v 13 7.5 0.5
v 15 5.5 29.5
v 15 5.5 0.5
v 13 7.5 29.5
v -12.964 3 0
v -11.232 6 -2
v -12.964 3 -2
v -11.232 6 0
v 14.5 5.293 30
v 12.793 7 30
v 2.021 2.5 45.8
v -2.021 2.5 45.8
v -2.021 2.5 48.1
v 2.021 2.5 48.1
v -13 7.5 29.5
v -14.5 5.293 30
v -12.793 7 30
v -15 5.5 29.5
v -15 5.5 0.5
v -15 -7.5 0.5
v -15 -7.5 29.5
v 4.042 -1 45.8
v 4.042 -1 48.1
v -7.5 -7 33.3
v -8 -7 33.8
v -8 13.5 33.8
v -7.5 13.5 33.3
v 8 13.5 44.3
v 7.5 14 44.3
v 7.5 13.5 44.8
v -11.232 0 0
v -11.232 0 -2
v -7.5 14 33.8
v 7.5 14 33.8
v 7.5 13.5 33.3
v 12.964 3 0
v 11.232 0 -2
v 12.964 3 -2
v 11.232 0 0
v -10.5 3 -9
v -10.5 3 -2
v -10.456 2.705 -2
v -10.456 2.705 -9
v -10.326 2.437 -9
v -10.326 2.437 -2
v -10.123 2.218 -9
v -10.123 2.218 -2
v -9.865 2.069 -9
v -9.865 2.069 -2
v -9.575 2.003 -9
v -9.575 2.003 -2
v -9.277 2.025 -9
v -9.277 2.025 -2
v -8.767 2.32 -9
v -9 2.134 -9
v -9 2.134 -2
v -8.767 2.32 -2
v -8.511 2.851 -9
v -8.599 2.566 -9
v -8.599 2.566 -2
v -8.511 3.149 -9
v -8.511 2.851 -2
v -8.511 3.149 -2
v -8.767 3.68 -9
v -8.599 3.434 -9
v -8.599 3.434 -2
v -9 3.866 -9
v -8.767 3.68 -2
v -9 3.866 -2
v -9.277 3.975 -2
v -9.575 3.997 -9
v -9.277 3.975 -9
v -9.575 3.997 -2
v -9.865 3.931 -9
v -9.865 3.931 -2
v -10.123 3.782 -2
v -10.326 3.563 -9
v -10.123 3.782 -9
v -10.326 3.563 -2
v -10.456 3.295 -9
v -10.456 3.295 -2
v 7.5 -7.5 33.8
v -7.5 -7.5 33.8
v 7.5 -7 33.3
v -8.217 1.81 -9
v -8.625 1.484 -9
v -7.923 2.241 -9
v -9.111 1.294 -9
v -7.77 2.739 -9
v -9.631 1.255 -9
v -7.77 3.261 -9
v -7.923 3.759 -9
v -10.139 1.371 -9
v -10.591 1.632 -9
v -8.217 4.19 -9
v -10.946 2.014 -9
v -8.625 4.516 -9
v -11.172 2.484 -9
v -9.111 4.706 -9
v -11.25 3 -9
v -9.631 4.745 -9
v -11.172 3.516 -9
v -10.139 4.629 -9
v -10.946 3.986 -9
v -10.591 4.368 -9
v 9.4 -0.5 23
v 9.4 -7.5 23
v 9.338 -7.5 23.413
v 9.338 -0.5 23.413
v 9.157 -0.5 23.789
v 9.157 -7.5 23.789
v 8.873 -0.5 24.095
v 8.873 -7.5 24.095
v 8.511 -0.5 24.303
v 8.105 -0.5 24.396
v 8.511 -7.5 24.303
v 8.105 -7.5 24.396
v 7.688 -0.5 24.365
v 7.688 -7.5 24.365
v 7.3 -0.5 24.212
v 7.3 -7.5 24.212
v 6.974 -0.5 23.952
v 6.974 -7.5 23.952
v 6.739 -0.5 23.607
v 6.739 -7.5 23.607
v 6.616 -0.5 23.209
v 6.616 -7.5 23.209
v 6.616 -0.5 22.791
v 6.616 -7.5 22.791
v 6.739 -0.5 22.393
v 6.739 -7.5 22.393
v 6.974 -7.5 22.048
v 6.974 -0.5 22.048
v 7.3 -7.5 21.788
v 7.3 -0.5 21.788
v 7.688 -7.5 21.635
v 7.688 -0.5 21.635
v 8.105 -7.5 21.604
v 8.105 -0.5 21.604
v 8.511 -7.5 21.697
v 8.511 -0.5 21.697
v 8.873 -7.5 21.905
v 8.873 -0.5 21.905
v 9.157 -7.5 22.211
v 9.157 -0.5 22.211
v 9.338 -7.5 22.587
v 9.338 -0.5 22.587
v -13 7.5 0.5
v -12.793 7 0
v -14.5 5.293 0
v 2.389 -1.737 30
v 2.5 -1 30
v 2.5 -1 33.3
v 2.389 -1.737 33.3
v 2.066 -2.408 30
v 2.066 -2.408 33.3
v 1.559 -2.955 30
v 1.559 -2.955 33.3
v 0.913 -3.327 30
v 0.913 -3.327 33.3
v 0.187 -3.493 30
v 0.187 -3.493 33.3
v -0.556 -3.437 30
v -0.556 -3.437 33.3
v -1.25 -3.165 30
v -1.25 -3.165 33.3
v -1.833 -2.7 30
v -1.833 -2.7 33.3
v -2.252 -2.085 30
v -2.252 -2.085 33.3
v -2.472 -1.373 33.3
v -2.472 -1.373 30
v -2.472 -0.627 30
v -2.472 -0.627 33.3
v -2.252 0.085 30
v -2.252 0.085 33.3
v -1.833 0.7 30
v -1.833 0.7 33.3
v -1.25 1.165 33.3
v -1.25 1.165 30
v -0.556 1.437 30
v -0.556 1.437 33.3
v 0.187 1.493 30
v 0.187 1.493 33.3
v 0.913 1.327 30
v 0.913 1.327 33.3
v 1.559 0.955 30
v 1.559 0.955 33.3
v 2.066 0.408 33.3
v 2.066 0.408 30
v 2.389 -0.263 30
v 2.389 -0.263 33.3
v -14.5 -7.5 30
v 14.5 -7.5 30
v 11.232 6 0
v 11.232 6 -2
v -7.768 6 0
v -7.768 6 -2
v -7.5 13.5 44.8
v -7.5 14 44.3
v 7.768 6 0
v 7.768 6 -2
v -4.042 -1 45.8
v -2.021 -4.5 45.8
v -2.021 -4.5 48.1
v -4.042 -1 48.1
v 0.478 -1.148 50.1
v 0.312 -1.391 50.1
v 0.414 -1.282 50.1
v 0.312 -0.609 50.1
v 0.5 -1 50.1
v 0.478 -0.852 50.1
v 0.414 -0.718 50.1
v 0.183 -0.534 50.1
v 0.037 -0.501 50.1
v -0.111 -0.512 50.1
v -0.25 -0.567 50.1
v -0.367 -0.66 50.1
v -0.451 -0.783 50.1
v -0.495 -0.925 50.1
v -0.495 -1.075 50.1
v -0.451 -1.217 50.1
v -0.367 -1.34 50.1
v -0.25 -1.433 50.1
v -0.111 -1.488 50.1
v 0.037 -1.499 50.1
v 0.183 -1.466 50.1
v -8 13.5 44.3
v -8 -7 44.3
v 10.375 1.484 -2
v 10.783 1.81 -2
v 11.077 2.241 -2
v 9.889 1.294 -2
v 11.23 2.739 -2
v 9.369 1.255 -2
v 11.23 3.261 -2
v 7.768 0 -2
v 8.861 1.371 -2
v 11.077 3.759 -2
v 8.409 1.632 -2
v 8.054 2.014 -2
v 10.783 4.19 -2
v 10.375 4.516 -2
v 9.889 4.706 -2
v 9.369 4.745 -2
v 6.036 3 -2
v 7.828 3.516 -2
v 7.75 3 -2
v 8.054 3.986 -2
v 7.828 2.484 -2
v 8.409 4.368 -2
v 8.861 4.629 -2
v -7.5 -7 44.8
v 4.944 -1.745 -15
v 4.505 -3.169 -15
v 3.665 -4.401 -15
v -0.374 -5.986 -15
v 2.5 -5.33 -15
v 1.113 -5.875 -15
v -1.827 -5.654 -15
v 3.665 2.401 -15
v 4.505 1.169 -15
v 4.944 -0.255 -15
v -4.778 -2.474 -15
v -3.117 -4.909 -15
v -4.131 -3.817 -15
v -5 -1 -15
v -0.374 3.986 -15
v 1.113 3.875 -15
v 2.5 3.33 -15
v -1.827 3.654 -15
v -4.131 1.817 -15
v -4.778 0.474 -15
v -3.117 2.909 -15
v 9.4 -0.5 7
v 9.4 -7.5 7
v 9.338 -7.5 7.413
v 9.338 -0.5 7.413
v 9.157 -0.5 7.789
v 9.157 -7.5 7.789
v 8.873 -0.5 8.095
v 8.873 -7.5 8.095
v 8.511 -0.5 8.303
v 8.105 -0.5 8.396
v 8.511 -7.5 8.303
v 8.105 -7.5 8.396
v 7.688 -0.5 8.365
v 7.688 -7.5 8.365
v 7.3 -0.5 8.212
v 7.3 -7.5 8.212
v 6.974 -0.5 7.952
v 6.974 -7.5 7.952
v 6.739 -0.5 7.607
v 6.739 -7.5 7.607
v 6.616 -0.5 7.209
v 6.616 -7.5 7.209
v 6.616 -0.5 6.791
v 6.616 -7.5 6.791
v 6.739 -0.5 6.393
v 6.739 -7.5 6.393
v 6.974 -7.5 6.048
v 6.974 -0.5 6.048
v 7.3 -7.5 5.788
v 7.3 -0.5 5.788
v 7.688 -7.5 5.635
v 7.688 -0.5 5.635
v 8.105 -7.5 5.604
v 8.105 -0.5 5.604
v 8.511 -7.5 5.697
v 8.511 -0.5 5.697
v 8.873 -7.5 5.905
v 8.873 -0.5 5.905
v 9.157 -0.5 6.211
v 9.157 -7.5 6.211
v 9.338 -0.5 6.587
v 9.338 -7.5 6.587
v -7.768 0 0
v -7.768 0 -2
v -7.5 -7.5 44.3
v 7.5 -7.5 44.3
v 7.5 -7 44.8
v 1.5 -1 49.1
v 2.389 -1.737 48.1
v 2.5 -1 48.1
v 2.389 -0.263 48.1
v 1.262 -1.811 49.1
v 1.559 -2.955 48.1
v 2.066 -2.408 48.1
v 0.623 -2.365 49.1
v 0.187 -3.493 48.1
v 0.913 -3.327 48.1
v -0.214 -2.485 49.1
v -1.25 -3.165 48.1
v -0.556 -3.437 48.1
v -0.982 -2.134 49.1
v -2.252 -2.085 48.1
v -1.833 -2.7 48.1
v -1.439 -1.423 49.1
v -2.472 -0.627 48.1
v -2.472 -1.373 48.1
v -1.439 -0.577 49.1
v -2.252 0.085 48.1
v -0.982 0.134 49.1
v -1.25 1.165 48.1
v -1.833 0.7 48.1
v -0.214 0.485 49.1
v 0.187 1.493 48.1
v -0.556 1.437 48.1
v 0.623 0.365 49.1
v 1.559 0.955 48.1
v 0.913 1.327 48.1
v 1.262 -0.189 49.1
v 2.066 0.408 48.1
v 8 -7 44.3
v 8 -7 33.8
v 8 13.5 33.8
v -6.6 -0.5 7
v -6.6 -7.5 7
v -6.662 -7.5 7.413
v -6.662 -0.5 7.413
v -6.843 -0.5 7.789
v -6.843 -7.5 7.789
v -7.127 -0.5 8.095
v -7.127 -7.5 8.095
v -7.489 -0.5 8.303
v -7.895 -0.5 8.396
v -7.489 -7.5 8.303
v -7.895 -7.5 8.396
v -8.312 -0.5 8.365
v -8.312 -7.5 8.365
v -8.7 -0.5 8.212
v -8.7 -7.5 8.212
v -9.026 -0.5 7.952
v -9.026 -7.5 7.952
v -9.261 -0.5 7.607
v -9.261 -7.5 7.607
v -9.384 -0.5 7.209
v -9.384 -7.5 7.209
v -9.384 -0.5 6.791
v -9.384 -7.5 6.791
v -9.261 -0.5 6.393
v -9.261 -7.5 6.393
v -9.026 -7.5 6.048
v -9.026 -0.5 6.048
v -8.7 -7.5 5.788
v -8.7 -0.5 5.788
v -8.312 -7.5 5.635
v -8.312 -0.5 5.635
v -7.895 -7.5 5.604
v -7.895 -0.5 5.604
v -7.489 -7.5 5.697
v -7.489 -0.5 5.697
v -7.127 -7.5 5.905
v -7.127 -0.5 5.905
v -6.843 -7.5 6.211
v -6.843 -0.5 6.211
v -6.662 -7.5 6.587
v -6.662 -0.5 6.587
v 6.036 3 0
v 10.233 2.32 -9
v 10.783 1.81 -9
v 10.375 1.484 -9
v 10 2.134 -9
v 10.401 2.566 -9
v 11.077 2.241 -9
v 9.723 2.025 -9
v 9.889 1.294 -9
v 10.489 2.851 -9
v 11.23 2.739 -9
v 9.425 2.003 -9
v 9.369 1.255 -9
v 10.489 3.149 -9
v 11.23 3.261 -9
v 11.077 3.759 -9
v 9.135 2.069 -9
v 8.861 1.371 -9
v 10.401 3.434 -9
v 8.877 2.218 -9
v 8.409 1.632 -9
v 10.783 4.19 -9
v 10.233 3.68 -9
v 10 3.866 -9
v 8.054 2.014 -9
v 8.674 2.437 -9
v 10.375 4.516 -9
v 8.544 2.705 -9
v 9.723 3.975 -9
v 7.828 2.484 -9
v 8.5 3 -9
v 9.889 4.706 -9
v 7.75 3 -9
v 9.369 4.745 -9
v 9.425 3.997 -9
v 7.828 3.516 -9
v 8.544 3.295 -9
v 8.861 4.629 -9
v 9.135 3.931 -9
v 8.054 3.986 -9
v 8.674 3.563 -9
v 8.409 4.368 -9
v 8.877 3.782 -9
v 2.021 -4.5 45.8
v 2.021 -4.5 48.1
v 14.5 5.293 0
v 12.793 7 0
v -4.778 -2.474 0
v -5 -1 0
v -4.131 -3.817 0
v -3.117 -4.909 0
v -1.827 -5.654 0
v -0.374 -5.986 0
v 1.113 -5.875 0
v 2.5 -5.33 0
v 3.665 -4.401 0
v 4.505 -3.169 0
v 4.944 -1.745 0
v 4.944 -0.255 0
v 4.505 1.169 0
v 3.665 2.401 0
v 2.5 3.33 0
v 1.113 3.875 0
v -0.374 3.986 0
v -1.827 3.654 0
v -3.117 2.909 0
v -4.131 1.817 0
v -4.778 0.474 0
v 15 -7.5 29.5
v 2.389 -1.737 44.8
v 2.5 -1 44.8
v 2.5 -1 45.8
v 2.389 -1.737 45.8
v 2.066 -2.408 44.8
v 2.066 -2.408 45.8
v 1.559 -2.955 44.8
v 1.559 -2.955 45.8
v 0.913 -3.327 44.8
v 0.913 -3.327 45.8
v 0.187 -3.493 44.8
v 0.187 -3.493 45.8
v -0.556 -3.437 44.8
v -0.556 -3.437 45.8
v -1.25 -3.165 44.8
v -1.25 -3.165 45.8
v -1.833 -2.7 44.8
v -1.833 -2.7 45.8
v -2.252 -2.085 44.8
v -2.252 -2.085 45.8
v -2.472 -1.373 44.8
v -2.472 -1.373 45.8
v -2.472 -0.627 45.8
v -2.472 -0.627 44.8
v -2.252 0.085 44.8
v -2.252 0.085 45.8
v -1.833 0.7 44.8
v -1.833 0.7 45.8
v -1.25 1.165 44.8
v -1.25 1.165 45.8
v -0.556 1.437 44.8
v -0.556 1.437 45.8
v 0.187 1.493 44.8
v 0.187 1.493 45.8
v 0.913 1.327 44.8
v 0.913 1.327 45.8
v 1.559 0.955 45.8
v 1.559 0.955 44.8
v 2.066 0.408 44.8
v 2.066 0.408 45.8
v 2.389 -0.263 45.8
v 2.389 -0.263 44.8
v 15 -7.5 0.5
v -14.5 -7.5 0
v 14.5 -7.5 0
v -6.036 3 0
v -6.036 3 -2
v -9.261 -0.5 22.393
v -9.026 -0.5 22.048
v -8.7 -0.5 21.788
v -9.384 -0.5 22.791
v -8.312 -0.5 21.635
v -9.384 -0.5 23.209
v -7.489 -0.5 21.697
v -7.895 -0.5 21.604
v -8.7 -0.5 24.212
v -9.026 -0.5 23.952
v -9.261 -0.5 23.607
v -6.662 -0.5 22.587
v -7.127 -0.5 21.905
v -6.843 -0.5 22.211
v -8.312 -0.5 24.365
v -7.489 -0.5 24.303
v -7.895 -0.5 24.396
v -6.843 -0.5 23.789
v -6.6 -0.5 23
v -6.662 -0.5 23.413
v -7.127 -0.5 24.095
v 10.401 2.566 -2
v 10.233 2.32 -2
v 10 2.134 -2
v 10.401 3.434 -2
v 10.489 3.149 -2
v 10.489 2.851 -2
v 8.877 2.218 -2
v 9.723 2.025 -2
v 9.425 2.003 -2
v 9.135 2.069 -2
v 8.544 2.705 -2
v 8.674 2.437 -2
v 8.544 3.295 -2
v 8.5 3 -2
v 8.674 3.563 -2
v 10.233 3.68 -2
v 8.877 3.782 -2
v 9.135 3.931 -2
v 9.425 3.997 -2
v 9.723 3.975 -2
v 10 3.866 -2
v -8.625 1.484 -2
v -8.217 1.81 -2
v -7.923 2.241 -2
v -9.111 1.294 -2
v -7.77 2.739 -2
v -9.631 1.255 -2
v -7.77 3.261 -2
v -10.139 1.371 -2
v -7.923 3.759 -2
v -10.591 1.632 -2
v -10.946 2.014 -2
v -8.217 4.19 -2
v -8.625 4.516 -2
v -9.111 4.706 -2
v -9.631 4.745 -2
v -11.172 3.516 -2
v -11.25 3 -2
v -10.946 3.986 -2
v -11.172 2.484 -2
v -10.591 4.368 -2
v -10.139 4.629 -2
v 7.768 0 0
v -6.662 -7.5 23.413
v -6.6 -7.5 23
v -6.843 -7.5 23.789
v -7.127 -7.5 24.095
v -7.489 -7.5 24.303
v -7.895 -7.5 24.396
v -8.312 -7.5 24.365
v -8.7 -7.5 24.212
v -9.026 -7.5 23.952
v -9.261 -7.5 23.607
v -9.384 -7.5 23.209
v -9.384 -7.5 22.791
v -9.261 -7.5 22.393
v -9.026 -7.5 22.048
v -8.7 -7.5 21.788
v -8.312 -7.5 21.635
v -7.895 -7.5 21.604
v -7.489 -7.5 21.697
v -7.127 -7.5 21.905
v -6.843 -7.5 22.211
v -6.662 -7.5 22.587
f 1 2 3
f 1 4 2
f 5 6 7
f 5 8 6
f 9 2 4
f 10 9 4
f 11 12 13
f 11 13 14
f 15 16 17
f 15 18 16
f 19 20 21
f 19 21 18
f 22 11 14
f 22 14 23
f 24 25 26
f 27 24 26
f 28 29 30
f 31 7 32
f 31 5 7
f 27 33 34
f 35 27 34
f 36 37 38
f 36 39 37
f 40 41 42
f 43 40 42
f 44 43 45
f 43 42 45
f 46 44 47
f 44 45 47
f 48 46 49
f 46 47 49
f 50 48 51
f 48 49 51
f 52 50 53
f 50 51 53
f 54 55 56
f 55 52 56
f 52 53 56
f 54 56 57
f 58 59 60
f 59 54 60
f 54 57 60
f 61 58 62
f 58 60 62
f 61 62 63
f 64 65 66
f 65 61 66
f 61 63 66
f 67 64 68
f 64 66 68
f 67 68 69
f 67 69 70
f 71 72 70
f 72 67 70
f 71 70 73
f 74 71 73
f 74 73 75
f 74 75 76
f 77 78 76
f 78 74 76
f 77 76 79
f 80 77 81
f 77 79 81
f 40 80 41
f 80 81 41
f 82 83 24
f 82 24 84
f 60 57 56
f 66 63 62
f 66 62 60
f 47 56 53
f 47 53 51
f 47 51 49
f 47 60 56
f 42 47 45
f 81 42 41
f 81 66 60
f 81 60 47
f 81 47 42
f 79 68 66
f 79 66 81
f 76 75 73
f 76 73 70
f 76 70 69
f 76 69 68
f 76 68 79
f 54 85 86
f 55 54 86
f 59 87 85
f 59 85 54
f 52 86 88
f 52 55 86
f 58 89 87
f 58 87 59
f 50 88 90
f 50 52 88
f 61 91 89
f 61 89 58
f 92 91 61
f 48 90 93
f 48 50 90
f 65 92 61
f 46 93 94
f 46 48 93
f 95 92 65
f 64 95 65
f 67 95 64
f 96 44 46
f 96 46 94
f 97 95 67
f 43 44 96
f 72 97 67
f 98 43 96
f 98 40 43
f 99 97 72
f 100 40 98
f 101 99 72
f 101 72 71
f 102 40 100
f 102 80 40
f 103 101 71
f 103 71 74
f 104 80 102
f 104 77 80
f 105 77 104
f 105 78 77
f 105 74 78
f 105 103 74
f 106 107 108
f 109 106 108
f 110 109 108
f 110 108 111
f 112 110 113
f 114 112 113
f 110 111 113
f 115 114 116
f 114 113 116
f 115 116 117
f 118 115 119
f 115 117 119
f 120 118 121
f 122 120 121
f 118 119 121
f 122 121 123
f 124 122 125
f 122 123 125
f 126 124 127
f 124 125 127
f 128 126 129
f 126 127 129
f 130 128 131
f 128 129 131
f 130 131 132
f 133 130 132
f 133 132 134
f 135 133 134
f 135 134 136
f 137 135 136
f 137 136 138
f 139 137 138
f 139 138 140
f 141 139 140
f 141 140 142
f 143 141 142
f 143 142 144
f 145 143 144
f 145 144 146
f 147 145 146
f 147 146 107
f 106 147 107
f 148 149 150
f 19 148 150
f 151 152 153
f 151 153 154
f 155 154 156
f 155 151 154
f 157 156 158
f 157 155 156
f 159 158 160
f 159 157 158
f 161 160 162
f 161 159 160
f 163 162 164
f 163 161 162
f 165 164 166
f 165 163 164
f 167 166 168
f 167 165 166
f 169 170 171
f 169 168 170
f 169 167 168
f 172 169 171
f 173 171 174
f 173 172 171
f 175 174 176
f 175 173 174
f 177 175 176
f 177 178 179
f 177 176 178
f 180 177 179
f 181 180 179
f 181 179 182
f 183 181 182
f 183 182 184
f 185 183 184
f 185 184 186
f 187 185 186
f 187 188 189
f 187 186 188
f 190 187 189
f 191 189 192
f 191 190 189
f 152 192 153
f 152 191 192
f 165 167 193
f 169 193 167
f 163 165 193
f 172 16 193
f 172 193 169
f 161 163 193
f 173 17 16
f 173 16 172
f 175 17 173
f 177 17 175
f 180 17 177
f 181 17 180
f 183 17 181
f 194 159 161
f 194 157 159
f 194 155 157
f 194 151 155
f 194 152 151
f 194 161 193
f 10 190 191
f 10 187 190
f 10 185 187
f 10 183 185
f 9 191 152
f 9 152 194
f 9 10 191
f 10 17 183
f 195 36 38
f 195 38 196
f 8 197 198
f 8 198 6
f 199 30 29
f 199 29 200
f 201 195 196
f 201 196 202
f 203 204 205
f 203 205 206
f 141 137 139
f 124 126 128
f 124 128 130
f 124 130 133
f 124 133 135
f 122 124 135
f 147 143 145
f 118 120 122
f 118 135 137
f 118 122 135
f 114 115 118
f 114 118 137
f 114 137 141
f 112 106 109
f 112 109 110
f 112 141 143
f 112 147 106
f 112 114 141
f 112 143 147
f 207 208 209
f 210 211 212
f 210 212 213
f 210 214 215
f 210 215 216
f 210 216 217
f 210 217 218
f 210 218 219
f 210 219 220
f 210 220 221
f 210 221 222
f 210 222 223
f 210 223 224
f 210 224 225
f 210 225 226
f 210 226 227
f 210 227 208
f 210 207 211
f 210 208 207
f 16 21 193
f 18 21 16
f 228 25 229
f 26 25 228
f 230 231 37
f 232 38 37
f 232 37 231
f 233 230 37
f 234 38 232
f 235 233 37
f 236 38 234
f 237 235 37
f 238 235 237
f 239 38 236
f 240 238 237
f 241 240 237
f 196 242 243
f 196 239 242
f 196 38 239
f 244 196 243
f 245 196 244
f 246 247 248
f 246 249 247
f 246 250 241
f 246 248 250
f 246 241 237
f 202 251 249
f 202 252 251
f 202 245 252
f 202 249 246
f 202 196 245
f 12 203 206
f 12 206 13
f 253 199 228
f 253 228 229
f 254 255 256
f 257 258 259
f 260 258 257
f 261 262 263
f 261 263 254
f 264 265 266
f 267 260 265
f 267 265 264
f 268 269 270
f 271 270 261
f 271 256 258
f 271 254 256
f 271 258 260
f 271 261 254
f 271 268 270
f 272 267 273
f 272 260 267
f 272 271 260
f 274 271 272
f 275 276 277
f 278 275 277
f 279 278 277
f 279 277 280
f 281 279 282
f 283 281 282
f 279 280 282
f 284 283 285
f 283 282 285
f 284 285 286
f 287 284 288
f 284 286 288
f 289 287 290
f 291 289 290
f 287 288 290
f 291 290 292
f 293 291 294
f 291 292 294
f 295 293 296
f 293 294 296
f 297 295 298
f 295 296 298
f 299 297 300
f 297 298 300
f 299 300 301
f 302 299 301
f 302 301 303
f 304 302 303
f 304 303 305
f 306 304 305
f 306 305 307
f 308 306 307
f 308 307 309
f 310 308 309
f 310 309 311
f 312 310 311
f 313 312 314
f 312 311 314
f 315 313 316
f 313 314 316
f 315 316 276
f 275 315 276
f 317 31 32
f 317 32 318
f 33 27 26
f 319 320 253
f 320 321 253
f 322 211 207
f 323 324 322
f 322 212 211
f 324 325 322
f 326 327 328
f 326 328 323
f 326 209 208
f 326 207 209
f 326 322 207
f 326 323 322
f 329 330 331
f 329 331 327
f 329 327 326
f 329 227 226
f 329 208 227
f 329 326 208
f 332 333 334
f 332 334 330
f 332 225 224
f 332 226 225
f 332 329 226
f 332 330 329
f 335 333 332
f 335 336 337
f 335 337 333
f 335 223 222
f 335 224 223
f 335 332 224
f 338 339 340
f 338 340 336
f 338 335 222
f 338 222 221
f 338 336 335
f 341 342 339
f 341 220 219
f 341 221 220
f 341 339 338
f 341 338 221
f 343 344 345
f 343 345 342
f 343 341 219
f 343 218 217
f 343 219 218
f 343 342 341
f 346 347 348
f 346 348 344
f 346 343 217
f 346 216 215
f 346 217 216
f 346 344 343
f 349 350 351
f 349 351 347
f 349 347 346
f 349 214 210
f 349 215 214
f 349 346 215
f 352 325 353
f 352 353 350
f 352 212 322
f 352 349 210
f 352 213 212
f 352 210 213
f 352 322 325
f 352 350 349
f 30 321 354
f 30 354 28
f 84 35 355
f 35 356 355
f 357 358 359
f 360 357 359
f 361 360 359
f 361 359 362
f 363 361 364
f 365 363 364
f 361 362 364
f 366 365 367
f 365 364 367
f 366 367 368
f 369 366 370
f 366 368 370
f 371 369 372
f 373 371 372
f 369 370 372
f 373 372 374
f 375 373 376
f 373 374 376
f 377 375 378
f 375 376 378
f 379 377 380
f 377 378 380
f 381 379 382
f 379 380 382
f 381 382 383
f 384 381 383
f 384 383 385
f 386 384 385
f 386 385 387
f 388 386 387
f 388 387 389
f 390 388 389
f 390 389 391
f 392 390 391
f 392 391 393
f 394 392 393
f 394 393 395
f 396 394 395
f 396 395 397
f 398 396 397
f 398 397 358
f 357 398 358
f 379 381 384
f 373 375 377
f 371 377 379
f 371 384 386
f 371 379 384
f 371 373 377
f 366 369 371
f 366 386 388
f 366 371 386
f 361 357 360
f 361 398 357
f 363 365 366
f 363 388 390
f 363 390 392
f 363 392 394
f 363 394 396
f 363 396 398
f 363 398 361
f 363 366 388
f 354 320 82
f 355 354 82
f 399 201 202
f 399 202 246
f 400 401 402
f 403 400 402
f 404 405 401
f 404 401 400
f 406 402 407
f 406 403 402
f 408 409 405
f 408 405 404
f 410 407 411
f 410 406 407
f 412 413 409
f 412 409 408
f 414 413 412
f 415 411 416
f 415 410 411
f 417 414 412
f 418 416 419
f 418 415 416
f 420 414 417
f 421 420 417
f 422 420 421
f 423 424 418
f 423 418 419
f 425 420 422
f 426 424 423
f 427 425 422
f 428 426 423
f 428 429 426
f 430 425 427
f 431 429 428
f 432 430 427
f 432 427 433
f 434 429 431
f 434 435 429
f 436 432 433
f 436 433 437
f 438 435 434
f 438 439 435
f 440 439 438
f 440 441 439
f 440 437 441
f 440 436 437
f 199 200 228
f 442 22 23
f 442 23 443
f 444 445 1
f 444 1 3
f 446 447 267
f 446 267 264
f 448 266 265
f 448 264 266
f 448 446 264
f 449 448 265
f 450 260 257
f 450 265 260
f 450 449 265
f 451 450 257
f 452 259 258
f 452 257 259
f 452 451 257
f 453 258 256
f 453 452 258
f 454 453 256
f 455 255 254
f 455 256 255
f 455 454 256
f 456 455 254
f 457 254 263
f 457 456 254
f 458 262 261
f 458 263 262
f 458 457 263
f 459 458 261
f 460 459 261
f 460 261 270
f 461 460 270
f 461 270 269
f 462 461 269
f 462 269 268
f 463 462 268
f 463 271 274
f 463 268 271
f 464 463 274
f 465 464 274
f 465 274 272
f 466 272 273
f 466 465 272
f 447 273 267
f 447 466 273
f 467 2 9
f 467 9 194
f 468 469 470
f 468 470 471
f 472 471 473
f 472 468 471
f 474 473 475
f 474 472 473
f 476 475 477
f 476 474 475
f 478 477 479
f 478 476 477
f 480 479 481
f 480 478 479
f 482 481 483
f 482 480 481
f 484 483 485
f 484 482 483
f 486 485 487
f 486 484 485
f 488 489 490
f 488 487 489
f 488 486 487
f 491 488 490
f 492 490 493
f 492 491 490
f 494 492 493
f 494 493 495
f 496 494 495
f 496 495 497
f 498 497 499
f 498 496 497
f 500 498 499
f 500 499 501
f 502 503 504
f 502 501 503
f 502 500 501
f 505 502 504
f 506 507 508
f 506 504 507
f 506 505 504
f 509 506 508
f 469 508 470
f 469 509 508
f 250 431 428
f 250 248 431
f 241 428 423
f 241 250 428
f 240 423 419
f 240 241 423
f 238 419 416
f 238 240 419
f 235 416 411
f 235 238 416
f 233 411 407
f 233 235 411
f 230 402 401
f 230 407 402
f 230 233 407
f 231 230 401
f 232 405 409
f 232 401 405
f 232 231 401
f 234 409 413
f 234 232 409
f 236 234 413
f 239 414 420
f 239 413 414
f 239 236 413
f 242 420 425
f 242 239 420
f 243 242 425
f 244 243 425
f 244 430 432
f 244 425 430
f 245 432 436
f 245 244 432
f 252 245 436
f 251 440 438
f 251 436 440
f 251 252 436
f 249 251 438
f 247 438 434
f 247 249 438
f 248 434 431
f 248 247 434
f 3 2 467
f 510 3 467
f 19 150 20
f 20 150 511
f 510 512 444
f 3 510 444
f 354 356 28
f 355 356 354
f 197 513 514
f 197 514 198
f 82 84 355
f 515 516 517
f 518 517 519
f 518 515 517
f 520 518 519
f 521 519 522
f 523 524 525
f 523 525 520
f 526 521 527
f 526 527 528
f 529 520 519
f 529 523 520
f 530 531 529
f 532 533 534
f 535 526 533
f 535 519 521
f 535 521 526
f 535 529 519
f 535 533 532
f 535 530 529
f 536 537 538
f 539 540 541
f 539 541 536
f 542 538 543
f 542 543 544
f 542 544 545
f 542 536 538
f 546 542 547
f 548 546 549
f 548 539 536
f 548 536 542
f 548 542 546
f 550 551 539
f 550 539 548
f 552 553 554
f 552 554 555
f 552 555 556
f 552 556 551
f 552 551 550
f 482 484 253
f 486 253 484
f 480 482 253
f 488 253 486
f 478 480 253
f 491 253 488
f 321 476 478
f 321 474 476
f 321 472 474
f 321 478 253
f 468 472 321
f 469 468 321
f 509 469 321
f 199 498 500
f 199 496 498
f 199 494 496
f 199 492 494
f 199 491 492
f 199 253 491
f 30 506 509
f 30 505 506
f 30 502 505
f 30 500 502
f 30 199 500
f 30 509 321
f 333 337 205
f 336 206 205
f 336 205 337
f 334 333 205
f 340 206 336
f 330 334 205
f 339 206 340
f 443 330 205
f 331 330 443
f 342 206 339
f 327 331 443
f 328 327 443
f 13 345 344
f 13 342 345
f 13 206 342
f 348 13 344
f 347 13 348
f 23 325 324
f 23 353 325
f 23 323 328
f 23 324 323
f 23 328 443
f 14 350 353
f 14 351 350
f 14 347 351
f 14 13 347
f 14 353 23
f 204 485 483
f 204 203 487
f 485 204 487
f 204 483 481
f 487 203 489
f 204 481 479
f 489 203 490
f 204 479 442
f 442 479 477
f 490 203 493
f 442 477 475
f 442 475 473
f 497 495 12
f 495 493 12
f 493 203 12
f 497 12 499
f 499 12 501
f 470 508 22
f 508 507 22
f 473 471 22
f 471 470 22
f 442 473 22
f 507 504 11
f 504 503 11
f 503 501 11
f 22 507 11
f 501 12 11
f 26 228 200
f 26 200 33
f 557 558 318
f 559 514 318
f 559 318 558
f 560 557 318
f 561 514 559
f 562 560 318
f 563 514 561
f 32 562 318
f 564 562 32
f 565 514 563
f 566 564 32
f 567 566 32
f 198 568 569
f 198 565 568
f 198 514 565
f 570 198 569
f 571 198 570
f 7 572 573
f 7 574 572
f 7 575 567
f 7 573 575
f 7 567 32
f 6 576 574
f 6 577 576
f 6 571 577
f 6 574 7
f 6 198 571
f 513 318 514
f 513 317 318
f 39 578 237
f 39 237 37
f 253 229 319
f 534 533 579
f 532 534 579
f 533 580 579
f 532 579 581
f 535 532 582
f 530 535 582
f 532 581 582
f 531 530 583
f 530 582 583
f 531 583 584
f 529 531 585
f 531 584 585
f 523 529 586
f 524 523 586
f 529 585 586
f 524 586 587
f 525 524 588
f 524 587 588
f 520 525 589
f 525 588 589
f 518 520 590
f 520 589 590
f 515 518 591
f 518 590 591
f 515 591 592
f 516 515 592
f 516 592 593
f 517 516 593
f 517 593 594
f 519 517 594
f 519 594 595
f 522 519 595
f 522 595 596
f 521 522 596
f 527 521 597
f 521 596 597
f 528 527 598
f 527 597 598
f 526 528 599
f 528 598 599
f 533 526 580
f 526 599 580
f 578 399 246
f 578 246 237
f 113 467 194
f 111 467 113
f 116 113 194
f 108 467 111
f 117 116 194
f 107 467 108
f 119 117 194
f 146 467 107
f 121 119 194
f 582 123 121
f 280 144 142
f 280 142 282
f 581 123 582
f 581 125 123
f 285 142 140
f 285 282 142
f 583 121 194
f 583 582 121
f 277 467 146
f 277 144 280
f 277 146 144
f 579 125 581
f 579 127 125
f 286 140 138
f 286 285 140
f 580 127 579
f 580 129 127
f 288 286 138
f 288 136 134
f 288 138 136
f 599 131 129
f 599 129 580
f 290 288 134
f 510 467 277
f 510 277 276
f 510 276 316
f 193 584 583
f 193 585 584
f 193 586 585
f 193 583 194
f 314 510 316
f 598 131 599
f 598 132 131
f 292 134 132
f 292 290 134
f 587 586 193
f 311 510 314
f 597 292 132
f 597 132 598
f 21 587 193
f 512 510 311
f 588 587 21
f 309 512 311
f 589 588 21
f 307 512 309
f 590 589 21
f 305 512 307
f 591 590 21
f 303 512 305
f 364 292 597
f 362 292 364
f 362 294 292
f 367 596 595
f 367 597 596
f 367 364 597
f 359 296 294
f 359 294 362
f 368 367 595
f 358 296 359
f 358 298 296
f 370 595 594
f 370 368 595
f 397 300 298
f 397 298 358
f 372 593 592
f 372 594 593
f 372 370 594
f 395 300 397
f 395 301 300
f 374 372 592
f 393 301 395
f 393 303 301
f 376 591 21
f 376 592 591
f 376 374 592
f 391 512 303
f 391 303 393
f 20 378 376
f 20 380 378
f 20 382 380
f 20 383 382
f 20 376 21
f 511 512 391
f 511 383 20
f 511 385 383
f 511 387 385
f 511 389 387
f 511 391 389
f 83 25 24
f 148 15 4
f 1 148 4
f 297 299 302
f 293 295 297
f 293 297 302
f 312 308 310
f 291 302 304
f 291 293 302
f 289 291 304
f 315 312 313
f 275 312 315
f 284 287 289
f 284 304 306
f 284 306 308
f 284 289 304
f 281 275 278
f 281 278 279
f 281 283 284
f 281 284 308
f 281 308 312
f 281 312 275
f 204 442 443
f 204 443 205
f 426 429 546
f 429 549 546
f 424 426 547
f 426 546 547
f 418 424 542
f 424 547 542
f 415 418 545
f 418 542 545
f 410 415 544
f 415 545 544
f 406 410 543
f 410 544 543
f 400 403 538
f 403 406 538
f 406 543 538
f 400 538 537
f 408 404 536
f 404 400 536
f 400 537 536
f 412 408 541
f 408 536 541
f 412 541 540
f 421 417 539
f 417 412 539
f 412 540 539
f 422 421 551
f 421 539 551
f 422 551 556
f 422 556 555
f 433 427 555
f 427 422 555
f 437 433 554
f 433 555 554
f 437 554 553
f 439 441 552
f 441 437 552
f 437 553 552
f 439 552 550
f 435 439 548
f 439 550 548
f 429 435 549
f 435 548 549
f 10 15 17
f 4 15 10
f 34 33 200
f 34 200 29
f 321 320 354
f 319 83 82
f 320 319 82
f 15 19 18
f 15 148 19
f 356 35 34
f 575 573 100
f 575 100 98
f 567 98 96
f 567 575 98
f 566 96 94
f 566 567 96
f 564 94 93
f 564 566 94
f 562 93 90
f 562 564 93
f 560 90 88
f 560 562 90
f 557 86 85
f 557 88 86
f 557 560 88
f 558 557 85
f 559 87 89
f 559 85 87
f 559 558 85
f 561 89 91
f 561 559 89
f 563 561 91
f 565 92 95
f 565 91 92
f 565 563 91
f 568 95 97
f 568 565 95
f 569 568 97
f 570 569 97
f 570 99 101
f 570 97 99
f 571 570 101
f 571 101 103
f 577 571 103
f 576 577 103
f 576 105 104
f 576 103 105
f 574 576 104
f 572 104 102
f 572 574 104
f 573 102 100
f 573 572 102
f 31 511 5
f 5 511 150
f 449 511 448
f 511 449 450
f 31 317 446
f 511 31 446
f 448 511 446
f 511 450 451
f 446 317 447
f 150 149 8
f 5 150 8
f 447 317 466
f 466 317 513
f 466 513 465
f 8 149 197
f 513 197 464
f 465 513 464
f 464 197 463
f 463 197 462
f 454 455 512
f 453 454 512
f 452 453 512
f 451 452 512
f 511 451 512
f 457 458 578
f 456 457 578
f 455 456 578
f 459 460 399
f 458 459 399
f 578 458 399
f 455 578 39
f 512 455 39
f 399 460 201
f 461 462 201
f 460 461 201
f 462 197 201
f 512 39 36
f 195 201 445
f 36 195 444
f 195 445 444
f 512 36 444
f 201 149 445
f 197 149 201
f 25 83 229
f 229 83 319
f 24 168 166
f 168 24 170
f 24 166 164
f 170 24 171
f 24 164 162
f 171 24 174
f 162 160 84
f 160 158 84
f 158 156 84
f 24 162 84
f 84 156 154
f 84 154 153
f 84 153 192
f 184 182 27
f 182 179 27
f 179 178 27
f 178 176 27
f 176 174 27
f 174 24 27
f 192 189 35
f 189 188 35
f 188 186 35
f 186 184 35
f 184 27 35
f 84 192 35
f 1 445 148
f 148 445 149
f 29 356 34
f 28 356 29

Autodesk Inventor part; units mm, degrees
ref_plane "YZ Plane" through (0, 0, 0) normal (1, 0, 0) x (0, 1, 0)
ref_plane "XZ Plane" through (0, 0, 0) normal (0, 1, 0) x (-1, 0, 0)
ref_plane "XY Plane" through (0, 0, 0) normal (0, 0, 1) x (1, 0, 0)
sketch "Sketch1" plane through (0, 0, 0) normal (0, 0, 1) x (1, 0, 0)
  line L0 (15, -7.5) -> (-15, -7.5)
  line L1 (-15, -7.5) -> (-15, 7.5)
  line L2 (-15, 7.5) -> (15, 7.5)
  line L3 (15, 7.5) -> (15, -7.5)
  line L4 (15, -7.5) -> (-15, 7.5) construction
  line L5 (-15, -7.5) -> (15, 7.5) construction
  point P0 (0, 0)
  dimension "d0" = 15
  dimension "d1" = 30
extrude "Extrusion1" add sketch "Sketch1" along normal blind 30
sketch "Sketch2" plane through (0, 0, 30) normal (0, 0, 1) x (1, 0, 0)
  line L0 (15, 7.5) -> (-15, 7.5) projected
  line L1 (-15, 7.5) -> (-15, -7.5) projected
  line L2 (-15, -7.5) -> (15, -7.5) projected
  line L3 (15, -7.5) -> (15, 7.5) projected
  circle A0 centre (0, -1) radius 2.5
  point P0 (0, 0)
  dimension "d4" = 6.5
  dimension "d5" = 5
extrude "Extrusion2" add sketch "Sketch2" along normal blind 3.3 contours A0
sketch "Sketch3" plane through (0, -1, 33.3) normal (0, 0, 1) x (1, 0, 0)
  circle A0 centre (0, 0) radius 2.5 projected
  line L0 (-8, 15) -> (8, 15)
  line L1 (8, 15) -> (8, -8)
  line L2 (8, -8) -> (-8, -8)
  line L3 (-8, -8) -> (-8, 15)
  line L4 (-8, 15) -> (8, -8) construction
  line L5 (8, 15) -> (-8, -8) construction
  line L6 (-15, -6.5) -> (15, -6.5) projected
  point P0 (0, 1)
  point P1 (0, 3.5)
  point P2 (0, 3.5)
  point P3 (-8, -6.5)
  point P4 (8, -6.5)
  dimension "d9" = 23
  dimension "d10" = 16
  dimension "d11" = 8
extrude "Extrusion3" add sketch "Sketch3" along normal blind 11.5 contours A0 | L0 L1 L6 L3
sketch "Sketch4" plane through (-15, -7.5, 0) normal (0, -1, 0) x (1, 0, 0)
  line L0 (0, 0) -> (30, 0) projected
  line L1 (30, 0) -> (30, 30) projected
  line L2 (0, 30) -> (30, 30) projected
  line L3 (0, 0) -> (0, 30) projected
  circle A0 centre (7, 7) radius 1.4
  circle A1 centre (23, 7) radius 1.4
  circle A2 centre (7, 23) radius 1.4
  circle A3 centre (23, 23) radius 1.4
  point P0 (15, 0)
  point P1 (15, 30)
  dimension "d16" = 16
  dimension "d19" = 16
  dimension "d22" = 8
  dimension "d23" = 7
  dimension "d24" = 2.8
extrude "Extrusion4" cut sketch "Sketch4" against normal blind 7 contours A0 | A1 | A2 | A3
sketch "Sketch5" plane through (0, -1, 44.8) normal (0, 0, 1) x (1, 0, 0)
  circle A0 centre (0, 0) radius 2.5 projected
  line L0 (-2.0207, 3.5) -> (2.0207, 3.5)
  line L1 (2.0207, 3.5) -> (4.0415, 0)
  line L2 (4.0415, 0) -> (2.0207, -3.5)
  line L3 (2.0207, -3.5) -> (-2.0207, -3.5)
  line L4 (-2.0207, -3.5) -> (-4.0415, 0)
  line L5 (-4.0415, 0) -> (-2.0207, 3.5)
  point P0 (0, 1)
  dimension "d35" = 7
extrude "Extrusion5" add sketch "Sketch5" along normal blind 3.3 contours A0 | L0 L1 L2 L3 L4 L5
sketch "Sketch6" plane through (0, -1, 48.1) normal (0, 0, 1) x (1, 0, 0)
  line L0 (-4.0415, 0) -> (-2.0207, -3.5) projected
  line L1 (-2.0207, -3.5) -> (2.0207, -3.5) projected
  line L2 (2.0207, -3.5) -> (4.0415, 0) projected
  line L3 (4.0415, 0) -> (2.0207, 3.5) projected
  line L4 (2.0207, 3.5) -> (-2.0207, 3.5) projected
  line L5 (-2.0207, 3.5) -> (-4.0415, 0) projected
  circle A0 centre (0, 0) radius 2.5 projected
  point P0 (0, 1)
extrude "Extrusion6" add sketch "Sketch6" along normal blind 2 contours A0
chamfer "Chamfer1" distance 2 angle 45 1 edges at (-2.5, -1, 50.1)
sketch "Sketch7" plane through (0, -1, 44.8) normal (0, 0, 1) x (1, 0, 0)
  circle A0 centre (0, 0) radius 2.5 projected
  circle A1 centre (0, 0) radius 2.5 projected
  line L0 (-4.0415, 0) -> (-2.0207, -3.5) projected
  line L1 (-2.0207, -3.5) -> (2.0207, -3.5) projected
  line L2 (2.0207, -3.5) -> (4.0415, 0) projected
  line L3 (4.0415, 0) -> (2.0207, 3.5) projected
  line L4 (2.0207, 3.5) -> (-2.0207, 3.5) projected
  line L5 (-2.0207, 3.5) -> (-4.0415, 0) projected
  point P0 (0, 1)
extrude "Extrusion7" cut sketch "Sketch7" along normal blind 1
chamfer "Chamfer2" distance 2 angle 45 2 edges at (-15, 7.5, 15) (15, 7.5, 15)
chamfer "Chamfer3" distance 0.5 angle 45 22 edges at (-8, 3.25, 33.3) (8, 3.25, 33.3) (0, 14, 33.3) (8, 14, 39.05) (-8, 14, 39.05) (0, 14, 44.8) (-8, 3.25, 44.8) (-8, -7.5, 39.05) (0, -7.5, 33.3) (8, -7.5, 39.05) (0, -7.5, 44.8) (8, 3.25, 44.8) (0, 7.5, 30) (15, -1, 30) (14, 6.5, 30) (-15, -1, 30) (-14, 6.5, 30) (-15, -1, 0) (-14, 6.5, 0) (0, 7.5, 0) (14, 6.5, 0) (15, -1, 0)
sketch "Sketch8" plane through (0, 0, 0) normal (0, 0, -1) x (-1, 0, 0)
  line L0 (-14.5, -7.5) -> (-14.5, 5.2929) projected
  line L1 (14.5, -7.5) -> (-14.5, -7.5) projected
  line L2 (14.5, 5.2929) -> (14.5, -7.5) projected
  line L3 (12.7929, 7) -> (14.5, 5.2929) projected
  line L4 (-12.7929, 7) -> (12.7929, 7) projected
  line L5 (-14.5, 5.2929) -> (-12.7929, 7) projected
  line L6 (7.7679, 6) -> (11.2321, 6)
  line L7 (11.2321, 6) -> (12.9641, 3)
  line L8 (12.9641, 3) -> (11.2321, 0)
  line L9 (11.2321, 0) -> (7.7679, 0)
  line L10 (7.7679, 0) -> (6.0359, 3)
  line L11 (6.0359, 3) -> (7.7679, 6)
  line L12 (-11.2321, 6) -> (-7.7679, 6)
  line L13 (-7.7679, 6) -> (-6.0359, 3)
  line L14 (-6.0359, 3) -> (-7.7679, 0)
  line L15 (-7.7679, 0) -> (-11.2321, 0)
  line L16 (-11.2321, 0) -> (-12.9641, 3)
  line L17 (-12.9641, 3) -> (-11.2321, 6)
  point P0 (0, 0)
  point P1 (9.5, 3)
  point P2 (-9.5, 3)
  dimension "d51" = 6
  dimension "d52" = 5
  dimension "d53" = 5
  dimension "d54" = 4
extrude "Extrusion8" add sketch "Sketch8" along normal blind 2 contours L6 L7 L8 L9 L10 L11 | L12 L13 L14 L15 L16 L17
sketch "Sketch9" plane through (0, 0, -2) normal (0, 0, -1) x (-1, 0, 0)
  line L0 (6.0359, 3) -> (7.7679, 0) projected
  line L1 (7.7679, 0) -> (11.2321, 0) projected
  line L2 (11.2321, 0) -> (12.9641, 3) projected
  line L3 (12.9641, 3) -> (11.2321, 6) projected
  line L4 (11.2321, 6) -> (7.7679, 6) projected
  line L5 (7.7679, 6) -> (6.0359, 3) projected
  line L6 (-12.9641, 3) -> (-11.2321, 0) projected
  line L7 (-11.2321, 0) -> (-7.7679, 0) projected
  line L8 (-7.7679, 0) -> (-6.0359, 3) projected
  line L9 (-6.0359, 3) -> (-7.7679, 6) projected
  line L10 (-7.7679, 6) -> (-11.2321, 6) projected
  line L11 (-11.2321, 6) -> (-12.9641, 3) projected
  circle A0 centre (9.5, 3) radius 1.75
  circle A1 centre (-9.5, 3) radius 1.75
  circle A2 centre (9.5, 3) radius 1
  circle A3 centre (-9.5, 3) radius 1
  point P0 (0, 0)
  point P1 (9.5, 0)
  point P2 (-9.5, 0)
  dimension "d57" = 3.5
  dimension "d58" = 2
extrude "Extrusion9" add sketch "Sketch9" along normal blind 7 contours A0 | A1
sketch "Sketch10" plane through (0, 0, 0) normal (0, 0, -1) x (-1, 0, 0)
  line L0 (-12.9641, 3) -> (-11.2321, 6) projected
  line L1 (-11.2321, 6) -> (-7.7679, 6) projected
  line L2 (-7.7679, 6) -> (-6.0359, 3) projected
  line L3 (-6.0359, 3) -> (-7.7679, 0) projected
  line L4 (-7.7679, 0) -> (-11.2321, 0) projected
  line L5 (-11.2321, 0) -> (-12.9641, 3) projected
  line L6 (6.0359, 3) -> (7.7679, 6) projected
  line L7 (7.7679, 6) -> (11.2321, 6) projected
  line L8 (11.2321, 6) -> (12.9641, 3) projected
  line L9 (12.9641, 3) -> (11.2321, 0) projected
  line L10 (11.2321, 0) -> (7.7679, 0) projected
  line L11 (7.7679, 0) -> (6.0359, 3) projected
  line L12 (-14.5, -7.5) -> (-14.5, 5.2929) projected
  line L13 (14.5, -7.5) -> (-14.5, -7.5) projected
  line L14 (14.5, 5.2929) -> (14.5, -7.5) projected
  line L15 (12.7929, 7) -> (14.5, 5.2929) projected
  line L16 (-12.7929, 7) -> (12.7929, 7) projected
  line L17 (-14.5, 5.2929) -> (-12.7929, 7) projected
  circle A0 centre (0, -1) radius 2.5 projected
  circle A1 centre (0, -1) radius 0.5 projected
  circle A2 centre (0, -1) radius 5
  point P0 (0, 0)
  dimension "d61" = 10
extrude "Extrusion10" add sketch "Sketch10" along normal blind 15 contours A0 | A1 | A2
equation "\"d22\" = 0.5 * d16"
equation "\"d53\" = d52"
properties part number "Arethusa" material "Aluminum 6061"
